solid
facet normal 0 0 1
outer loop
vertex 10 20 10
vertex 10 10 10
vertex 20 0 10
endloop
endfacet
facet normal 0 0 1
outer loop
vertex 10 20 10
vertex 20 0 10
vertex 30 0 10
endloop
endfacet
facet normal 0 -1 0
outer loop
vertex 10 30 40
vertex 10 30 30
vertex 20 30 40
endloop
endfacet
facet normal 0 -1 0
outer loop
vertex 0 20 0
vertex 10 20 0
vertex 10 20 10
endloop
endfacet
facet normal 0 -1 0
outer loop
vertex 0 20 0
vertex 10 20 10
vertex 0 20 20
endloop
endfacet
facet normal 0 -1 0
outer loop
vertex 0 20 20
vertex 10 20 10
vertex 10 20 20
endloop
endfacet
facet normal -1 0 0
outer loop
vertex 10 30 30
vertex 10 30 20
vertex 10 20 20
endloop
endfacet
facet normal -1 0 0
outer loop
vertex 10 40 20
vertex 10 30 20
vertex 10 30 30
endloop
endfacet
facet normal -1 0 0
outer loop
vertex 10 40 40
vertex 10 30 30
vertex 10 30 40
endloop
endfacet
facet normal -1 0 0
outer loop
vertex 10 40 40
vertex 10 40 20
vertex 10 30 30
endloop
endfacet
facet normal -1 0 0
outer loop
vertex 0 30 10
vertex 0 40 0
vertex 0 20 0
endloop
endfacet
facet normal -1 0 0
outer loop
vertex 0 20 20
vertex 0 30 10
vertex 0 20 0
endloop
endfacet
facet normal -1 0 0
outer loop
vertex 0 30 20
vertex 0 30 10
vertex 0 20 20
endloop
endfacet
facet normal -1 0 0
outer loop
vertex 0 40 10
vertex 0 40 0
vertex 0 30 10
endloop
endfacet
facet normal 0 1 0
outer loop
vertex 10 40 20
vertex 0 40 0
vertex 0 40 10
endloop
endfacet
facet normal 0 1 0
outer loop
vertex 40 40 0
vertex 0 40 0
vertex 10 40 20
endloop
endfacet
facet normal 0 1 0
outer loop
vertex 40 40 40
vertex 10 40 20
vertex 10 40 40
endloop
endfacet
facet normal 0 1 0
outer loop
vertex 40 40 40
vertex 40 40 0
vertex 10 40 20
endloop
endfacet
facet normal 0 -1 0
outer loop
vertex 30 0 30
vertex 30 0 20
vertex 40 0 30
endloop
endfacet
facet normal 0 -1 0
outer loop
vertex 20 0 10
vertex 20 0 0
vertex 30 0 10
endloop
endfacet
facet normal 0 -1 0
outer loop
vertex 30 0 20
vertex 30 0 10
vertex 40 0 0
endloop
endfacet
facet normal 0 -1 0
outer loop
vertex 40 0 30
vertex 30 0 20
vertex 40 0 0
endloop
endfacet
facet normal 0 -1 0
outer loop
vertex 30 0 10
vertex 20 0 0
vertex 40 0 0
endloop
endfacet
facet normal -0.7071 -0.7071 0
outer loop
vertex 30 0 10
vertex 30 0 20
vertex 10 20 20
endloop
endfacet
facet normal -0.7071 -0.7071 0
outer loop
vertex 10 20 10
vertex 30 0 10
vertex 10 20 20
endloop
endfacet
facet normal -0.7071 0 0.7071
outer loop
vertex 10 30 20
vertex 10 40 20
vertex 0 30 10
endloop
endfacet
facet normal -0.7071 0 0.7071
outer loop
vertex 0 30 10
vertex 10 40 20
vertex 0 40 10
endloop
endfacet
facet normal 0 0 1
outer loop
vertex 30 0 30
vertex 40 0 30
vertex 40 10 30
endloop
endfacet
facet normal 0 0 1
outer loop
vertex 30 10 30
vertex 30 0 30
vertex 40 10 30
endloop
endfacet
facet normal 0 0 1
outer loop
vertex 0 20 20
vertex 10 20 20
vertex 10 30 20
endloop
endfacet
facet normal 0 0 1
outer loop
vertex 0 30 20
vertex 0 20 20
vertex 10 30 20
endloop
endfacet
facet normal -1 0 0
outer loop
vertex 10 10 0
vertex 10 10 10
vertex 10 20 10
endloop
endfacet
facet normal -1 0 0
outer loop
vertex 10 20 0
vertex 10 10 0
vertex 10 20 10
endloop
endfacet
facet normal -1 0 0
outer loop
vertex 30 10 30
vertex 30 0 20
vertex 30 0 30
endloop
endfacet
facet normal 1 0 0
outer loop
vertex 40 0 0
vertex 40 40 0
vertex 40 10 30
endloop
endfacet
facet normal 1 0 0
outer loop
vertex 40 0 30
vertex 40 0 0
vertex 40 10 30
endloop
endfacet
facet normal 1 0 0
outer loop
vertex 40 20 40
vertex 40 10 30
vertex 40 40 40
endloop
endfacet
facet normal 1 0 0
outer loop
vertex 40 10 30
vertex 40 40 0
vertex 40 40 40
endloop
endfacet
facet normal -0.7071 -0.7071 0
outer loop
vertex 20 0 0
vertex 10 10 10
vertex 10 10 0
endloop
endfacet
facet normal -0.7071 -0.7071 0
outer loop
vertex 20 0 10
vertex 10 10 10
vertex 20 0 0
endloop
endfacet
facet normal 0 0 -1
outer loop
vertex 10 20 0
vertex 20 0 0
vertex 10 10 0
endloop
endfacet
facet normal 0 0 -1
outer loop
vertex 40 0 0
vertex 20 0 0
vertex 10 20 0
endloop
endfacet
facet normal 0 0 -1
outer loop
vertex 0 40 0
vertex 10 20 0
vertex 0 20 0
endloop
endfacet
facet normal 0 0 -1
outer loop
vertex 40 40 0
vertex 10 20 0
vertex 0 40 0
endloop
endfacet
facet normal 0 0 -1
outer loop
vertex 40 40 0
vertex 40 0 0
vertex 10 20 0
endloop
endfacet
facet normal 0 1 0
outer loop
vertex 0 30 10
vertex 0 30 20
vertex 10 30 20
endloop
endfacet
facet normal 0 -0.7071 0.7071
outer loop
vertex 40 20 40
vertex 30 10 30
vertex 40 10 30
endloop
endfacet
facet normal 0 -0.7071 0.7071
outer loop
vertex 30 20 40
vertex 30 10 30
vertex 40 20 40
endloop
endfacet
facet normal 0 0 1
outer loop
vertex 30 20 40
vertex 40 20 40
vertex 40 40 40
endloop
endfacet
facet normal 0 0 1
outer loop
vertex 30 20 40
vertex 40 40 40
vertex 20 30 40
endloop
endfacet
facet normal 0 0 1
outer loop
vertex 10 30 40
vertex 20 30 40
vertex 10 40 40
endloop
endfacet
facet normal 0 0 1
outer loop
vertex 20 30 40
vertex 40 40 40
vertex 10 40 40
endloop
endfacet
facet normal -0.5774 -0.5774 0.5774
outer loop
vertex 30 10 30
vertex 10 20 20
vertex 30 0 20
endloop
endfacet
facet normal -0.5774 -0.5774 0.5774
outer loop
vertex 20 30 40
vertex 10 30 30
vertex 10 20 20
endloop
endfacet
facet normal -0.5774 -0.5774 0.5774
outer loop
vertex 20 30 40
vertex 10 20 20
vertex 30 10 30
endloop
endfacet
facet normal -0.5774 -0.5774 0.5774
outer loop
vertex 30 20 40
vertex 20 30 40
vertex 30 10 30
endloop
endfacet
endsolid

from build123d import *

# Parameters (mm, degrees)
SKETCH1_W            = 40
SKETCH1_H            = 40
BOSS_EXTRUDE1_DEPTH  = 20
BOSS_EXTRUDE3_DEPTH  = 10
SKETCH3_W            = 10
SKETCH3_H            = 30
BOSS_EXTRUDE5_DEPTH  = 10
BOSS_EXTRUDE6_DEPTH  = 10
SKETCH5_W            = 10
SKETCH5_H            = 40
CUT_EXTRUDE3_DEPTH   = 25
CUT_EXTRUDE4_DEPTH   = 25
CUT_EXTRUDE5_DEPTH   = 10
SKETCH9_W            = 20
SKETCH9_H            = 20
BOSS_EXTRUDE7_DEPTH  = 10
CUT_EXTRUDE6_DEPTH   = 10
BOSS_EXTRUDE8_DEPTH  = 10
SKETCH12_W           = 20
SKETCH12_H           = 10
BOSS_EXTRUDE9_DEPTH  = 20
BOSS_EXTRUDE10_DEPTH = 20
BOSS_EXTRUDE11_DEPTH = 20
BOSS_EXTRUDE12_DEPTH = 17


with BuildPart() as part:
    # Sketch1 → Boss-Extrude1 (new body)
    with BuildSketch(Plane.XY):
        with Locations((20, 20)):
            Rectangle(SKETCH1_W, SKETCH1_H)
    extrude(amount=BOSS_EXTRUDE1_DEPTH)

    # Sketch3 → Boss-Extrude5 (add)
    with BuildSketch(Plane(origin=(40, 0, 0), x_dir=(0, 0, -1), z_dir=(1, 0, 0))):
        with Locations((-25, 25)):
            Rectangle(SKETCH3_W, SKETCH3_H)
    extrude(amount=-BOSS_EXTRUDE5_DEPTH)



with BuildPart() as body_2:
    # Sketch2 → Boss-Extrude3 (new body)
    with BuildSketch(Plane(origin=(40, 0, 0), x_dir=(0, 0, -1), z_dir=(1, 0, 0))):
        Polygon((-30, 10), (-20, 0), (-30, 0), align=None)
    extrude(amount=-BOSS_EXTRUDE3_DEPTH)


with BuildPart() as part_1:
    add(part.part)

    add(body_2.part)  # Boss-Extrude6 merges body 2
    # Sketch4 → Boss-Extrude6 (add)
    with BuildSketch(Plane(origin=(40, 0, 0), x_dir=(0, 0, -1), z_dir=(1, 0, 0))):
        Polygon((-20, 0), (-20, 10), (-30, 10), align=None)
    extrude(amount=-BOSS_EXTRUDE6_DEPTH)

    # Sketch5 → Cut-Extrude3 (cut)
    with BuildSketch(Plane.XY.offset(20)):
        with Locations((5, 20)):
            Rectangle(SKETCH5_W, SKETCH5_H)
    extrude(amount=-CUT_EXTRUDE3_DEPTH, mode=Mode.SUBTRACT)

    # Sketch7 → Cut-Extrude4 (cut)
    with BuildSketch(Plane.XY.offset(20)):
        Polygon((10, 10), (20, 0), (10, 0), align=None)
    extrude(amount=-CUT_EXTRUDE4_DEPTH, mode=Mode.SUBTRACT)

    # Sketch8 → Cut-Extrude5 (cut)
    with BuildSketch(Plane.XY.offset(20)):
        Polygon((30, 0), (10, 20), (10, 10), (20, 0), align=None)
    extrude(amount=-CUT_EXTRUDE5_DEPTH, mode=Mode.SUBTRACT)

    # Sketch9 → Boss-Extrude7 (add)
    with BuildSketch(Plane.ZY.offset(-10)):
        with Locations((10, 30)):
            Rectangle(SKETCH9_W, SKETCH9_H)
    extrude(amount=BOSS_EXTRUDE7_DEPTH)

    # Sketch10 → Cut-Extrude6 (cut)
    with BuildSketch(Plane(origin=(0, 40, 0), x_dir=(1, 0, 0), z_dir=(0, 1, 0))):
        Polygon((10, -20), (0, -10), (0, -20), align=None)
    extrude(amount=-CUT_EXTRUDE6_DEPTH, mode=Mode.SUBTRACT)

    # Sketch11 → Boss-Extrude8 (add)
    with BuildSketch(Plane.ZY.offset(-30)):
        Polygon((30, 10), (40, 20), (40, 40), (30, 40), align=None)
    extrude(amount=-BOSS_EXTRUDE8_DEPTH)

    # Sketch12 → Boss-Extrude9 (add)
    with BuildSketch(Plane.ZY.offset(-30)):
        with Locations((30, 35)):
            Rectangle(SKETCH12_W, SKETCH12_H)
    extrude(amount=BOSS_EXTRUDE9_DEPTH)

    # Sketch13 → Boss-Extrude10 (add)
    with BuildSketch(Plane.XY.offset(40)):
        Polygon((30, 20), (20, 30), (30, 30), align=None)
    extrude(amount=-BOSS_EXTRUDE10_DEPTH)

    # Sketch16 → Boss-Extrude11 (add)
    with BuildSketch(Plane.ZY.offset(-10)):
        Polygon((20, 20), (30, 30), (20, 30), align=None)
    extrude(amount=-BOSS_EXTRUDE11_DEPTH)

    # Sketch17 → Boss-Extrude12 (add)
    with BuildSketch(Plane(origin=(3.333333333, 3.333333333, -3.333333333), x_dir=(-0.816496581, 0.40824829, -0.40824829), z_dir=(0.577350269, 0.577350269, -0.577350269))):
        Polygon((-32.659863237, 42.426406871), (-20.412414523, 49.497474683), (-8.164965809, 42.426406871), (-8.164965809, 28.284271247), (-32.659863237, 14.142135624), align=None)
    extrude(amount=BOSS_EXTRUDE12_DEPTH)


solid = part_1.part
